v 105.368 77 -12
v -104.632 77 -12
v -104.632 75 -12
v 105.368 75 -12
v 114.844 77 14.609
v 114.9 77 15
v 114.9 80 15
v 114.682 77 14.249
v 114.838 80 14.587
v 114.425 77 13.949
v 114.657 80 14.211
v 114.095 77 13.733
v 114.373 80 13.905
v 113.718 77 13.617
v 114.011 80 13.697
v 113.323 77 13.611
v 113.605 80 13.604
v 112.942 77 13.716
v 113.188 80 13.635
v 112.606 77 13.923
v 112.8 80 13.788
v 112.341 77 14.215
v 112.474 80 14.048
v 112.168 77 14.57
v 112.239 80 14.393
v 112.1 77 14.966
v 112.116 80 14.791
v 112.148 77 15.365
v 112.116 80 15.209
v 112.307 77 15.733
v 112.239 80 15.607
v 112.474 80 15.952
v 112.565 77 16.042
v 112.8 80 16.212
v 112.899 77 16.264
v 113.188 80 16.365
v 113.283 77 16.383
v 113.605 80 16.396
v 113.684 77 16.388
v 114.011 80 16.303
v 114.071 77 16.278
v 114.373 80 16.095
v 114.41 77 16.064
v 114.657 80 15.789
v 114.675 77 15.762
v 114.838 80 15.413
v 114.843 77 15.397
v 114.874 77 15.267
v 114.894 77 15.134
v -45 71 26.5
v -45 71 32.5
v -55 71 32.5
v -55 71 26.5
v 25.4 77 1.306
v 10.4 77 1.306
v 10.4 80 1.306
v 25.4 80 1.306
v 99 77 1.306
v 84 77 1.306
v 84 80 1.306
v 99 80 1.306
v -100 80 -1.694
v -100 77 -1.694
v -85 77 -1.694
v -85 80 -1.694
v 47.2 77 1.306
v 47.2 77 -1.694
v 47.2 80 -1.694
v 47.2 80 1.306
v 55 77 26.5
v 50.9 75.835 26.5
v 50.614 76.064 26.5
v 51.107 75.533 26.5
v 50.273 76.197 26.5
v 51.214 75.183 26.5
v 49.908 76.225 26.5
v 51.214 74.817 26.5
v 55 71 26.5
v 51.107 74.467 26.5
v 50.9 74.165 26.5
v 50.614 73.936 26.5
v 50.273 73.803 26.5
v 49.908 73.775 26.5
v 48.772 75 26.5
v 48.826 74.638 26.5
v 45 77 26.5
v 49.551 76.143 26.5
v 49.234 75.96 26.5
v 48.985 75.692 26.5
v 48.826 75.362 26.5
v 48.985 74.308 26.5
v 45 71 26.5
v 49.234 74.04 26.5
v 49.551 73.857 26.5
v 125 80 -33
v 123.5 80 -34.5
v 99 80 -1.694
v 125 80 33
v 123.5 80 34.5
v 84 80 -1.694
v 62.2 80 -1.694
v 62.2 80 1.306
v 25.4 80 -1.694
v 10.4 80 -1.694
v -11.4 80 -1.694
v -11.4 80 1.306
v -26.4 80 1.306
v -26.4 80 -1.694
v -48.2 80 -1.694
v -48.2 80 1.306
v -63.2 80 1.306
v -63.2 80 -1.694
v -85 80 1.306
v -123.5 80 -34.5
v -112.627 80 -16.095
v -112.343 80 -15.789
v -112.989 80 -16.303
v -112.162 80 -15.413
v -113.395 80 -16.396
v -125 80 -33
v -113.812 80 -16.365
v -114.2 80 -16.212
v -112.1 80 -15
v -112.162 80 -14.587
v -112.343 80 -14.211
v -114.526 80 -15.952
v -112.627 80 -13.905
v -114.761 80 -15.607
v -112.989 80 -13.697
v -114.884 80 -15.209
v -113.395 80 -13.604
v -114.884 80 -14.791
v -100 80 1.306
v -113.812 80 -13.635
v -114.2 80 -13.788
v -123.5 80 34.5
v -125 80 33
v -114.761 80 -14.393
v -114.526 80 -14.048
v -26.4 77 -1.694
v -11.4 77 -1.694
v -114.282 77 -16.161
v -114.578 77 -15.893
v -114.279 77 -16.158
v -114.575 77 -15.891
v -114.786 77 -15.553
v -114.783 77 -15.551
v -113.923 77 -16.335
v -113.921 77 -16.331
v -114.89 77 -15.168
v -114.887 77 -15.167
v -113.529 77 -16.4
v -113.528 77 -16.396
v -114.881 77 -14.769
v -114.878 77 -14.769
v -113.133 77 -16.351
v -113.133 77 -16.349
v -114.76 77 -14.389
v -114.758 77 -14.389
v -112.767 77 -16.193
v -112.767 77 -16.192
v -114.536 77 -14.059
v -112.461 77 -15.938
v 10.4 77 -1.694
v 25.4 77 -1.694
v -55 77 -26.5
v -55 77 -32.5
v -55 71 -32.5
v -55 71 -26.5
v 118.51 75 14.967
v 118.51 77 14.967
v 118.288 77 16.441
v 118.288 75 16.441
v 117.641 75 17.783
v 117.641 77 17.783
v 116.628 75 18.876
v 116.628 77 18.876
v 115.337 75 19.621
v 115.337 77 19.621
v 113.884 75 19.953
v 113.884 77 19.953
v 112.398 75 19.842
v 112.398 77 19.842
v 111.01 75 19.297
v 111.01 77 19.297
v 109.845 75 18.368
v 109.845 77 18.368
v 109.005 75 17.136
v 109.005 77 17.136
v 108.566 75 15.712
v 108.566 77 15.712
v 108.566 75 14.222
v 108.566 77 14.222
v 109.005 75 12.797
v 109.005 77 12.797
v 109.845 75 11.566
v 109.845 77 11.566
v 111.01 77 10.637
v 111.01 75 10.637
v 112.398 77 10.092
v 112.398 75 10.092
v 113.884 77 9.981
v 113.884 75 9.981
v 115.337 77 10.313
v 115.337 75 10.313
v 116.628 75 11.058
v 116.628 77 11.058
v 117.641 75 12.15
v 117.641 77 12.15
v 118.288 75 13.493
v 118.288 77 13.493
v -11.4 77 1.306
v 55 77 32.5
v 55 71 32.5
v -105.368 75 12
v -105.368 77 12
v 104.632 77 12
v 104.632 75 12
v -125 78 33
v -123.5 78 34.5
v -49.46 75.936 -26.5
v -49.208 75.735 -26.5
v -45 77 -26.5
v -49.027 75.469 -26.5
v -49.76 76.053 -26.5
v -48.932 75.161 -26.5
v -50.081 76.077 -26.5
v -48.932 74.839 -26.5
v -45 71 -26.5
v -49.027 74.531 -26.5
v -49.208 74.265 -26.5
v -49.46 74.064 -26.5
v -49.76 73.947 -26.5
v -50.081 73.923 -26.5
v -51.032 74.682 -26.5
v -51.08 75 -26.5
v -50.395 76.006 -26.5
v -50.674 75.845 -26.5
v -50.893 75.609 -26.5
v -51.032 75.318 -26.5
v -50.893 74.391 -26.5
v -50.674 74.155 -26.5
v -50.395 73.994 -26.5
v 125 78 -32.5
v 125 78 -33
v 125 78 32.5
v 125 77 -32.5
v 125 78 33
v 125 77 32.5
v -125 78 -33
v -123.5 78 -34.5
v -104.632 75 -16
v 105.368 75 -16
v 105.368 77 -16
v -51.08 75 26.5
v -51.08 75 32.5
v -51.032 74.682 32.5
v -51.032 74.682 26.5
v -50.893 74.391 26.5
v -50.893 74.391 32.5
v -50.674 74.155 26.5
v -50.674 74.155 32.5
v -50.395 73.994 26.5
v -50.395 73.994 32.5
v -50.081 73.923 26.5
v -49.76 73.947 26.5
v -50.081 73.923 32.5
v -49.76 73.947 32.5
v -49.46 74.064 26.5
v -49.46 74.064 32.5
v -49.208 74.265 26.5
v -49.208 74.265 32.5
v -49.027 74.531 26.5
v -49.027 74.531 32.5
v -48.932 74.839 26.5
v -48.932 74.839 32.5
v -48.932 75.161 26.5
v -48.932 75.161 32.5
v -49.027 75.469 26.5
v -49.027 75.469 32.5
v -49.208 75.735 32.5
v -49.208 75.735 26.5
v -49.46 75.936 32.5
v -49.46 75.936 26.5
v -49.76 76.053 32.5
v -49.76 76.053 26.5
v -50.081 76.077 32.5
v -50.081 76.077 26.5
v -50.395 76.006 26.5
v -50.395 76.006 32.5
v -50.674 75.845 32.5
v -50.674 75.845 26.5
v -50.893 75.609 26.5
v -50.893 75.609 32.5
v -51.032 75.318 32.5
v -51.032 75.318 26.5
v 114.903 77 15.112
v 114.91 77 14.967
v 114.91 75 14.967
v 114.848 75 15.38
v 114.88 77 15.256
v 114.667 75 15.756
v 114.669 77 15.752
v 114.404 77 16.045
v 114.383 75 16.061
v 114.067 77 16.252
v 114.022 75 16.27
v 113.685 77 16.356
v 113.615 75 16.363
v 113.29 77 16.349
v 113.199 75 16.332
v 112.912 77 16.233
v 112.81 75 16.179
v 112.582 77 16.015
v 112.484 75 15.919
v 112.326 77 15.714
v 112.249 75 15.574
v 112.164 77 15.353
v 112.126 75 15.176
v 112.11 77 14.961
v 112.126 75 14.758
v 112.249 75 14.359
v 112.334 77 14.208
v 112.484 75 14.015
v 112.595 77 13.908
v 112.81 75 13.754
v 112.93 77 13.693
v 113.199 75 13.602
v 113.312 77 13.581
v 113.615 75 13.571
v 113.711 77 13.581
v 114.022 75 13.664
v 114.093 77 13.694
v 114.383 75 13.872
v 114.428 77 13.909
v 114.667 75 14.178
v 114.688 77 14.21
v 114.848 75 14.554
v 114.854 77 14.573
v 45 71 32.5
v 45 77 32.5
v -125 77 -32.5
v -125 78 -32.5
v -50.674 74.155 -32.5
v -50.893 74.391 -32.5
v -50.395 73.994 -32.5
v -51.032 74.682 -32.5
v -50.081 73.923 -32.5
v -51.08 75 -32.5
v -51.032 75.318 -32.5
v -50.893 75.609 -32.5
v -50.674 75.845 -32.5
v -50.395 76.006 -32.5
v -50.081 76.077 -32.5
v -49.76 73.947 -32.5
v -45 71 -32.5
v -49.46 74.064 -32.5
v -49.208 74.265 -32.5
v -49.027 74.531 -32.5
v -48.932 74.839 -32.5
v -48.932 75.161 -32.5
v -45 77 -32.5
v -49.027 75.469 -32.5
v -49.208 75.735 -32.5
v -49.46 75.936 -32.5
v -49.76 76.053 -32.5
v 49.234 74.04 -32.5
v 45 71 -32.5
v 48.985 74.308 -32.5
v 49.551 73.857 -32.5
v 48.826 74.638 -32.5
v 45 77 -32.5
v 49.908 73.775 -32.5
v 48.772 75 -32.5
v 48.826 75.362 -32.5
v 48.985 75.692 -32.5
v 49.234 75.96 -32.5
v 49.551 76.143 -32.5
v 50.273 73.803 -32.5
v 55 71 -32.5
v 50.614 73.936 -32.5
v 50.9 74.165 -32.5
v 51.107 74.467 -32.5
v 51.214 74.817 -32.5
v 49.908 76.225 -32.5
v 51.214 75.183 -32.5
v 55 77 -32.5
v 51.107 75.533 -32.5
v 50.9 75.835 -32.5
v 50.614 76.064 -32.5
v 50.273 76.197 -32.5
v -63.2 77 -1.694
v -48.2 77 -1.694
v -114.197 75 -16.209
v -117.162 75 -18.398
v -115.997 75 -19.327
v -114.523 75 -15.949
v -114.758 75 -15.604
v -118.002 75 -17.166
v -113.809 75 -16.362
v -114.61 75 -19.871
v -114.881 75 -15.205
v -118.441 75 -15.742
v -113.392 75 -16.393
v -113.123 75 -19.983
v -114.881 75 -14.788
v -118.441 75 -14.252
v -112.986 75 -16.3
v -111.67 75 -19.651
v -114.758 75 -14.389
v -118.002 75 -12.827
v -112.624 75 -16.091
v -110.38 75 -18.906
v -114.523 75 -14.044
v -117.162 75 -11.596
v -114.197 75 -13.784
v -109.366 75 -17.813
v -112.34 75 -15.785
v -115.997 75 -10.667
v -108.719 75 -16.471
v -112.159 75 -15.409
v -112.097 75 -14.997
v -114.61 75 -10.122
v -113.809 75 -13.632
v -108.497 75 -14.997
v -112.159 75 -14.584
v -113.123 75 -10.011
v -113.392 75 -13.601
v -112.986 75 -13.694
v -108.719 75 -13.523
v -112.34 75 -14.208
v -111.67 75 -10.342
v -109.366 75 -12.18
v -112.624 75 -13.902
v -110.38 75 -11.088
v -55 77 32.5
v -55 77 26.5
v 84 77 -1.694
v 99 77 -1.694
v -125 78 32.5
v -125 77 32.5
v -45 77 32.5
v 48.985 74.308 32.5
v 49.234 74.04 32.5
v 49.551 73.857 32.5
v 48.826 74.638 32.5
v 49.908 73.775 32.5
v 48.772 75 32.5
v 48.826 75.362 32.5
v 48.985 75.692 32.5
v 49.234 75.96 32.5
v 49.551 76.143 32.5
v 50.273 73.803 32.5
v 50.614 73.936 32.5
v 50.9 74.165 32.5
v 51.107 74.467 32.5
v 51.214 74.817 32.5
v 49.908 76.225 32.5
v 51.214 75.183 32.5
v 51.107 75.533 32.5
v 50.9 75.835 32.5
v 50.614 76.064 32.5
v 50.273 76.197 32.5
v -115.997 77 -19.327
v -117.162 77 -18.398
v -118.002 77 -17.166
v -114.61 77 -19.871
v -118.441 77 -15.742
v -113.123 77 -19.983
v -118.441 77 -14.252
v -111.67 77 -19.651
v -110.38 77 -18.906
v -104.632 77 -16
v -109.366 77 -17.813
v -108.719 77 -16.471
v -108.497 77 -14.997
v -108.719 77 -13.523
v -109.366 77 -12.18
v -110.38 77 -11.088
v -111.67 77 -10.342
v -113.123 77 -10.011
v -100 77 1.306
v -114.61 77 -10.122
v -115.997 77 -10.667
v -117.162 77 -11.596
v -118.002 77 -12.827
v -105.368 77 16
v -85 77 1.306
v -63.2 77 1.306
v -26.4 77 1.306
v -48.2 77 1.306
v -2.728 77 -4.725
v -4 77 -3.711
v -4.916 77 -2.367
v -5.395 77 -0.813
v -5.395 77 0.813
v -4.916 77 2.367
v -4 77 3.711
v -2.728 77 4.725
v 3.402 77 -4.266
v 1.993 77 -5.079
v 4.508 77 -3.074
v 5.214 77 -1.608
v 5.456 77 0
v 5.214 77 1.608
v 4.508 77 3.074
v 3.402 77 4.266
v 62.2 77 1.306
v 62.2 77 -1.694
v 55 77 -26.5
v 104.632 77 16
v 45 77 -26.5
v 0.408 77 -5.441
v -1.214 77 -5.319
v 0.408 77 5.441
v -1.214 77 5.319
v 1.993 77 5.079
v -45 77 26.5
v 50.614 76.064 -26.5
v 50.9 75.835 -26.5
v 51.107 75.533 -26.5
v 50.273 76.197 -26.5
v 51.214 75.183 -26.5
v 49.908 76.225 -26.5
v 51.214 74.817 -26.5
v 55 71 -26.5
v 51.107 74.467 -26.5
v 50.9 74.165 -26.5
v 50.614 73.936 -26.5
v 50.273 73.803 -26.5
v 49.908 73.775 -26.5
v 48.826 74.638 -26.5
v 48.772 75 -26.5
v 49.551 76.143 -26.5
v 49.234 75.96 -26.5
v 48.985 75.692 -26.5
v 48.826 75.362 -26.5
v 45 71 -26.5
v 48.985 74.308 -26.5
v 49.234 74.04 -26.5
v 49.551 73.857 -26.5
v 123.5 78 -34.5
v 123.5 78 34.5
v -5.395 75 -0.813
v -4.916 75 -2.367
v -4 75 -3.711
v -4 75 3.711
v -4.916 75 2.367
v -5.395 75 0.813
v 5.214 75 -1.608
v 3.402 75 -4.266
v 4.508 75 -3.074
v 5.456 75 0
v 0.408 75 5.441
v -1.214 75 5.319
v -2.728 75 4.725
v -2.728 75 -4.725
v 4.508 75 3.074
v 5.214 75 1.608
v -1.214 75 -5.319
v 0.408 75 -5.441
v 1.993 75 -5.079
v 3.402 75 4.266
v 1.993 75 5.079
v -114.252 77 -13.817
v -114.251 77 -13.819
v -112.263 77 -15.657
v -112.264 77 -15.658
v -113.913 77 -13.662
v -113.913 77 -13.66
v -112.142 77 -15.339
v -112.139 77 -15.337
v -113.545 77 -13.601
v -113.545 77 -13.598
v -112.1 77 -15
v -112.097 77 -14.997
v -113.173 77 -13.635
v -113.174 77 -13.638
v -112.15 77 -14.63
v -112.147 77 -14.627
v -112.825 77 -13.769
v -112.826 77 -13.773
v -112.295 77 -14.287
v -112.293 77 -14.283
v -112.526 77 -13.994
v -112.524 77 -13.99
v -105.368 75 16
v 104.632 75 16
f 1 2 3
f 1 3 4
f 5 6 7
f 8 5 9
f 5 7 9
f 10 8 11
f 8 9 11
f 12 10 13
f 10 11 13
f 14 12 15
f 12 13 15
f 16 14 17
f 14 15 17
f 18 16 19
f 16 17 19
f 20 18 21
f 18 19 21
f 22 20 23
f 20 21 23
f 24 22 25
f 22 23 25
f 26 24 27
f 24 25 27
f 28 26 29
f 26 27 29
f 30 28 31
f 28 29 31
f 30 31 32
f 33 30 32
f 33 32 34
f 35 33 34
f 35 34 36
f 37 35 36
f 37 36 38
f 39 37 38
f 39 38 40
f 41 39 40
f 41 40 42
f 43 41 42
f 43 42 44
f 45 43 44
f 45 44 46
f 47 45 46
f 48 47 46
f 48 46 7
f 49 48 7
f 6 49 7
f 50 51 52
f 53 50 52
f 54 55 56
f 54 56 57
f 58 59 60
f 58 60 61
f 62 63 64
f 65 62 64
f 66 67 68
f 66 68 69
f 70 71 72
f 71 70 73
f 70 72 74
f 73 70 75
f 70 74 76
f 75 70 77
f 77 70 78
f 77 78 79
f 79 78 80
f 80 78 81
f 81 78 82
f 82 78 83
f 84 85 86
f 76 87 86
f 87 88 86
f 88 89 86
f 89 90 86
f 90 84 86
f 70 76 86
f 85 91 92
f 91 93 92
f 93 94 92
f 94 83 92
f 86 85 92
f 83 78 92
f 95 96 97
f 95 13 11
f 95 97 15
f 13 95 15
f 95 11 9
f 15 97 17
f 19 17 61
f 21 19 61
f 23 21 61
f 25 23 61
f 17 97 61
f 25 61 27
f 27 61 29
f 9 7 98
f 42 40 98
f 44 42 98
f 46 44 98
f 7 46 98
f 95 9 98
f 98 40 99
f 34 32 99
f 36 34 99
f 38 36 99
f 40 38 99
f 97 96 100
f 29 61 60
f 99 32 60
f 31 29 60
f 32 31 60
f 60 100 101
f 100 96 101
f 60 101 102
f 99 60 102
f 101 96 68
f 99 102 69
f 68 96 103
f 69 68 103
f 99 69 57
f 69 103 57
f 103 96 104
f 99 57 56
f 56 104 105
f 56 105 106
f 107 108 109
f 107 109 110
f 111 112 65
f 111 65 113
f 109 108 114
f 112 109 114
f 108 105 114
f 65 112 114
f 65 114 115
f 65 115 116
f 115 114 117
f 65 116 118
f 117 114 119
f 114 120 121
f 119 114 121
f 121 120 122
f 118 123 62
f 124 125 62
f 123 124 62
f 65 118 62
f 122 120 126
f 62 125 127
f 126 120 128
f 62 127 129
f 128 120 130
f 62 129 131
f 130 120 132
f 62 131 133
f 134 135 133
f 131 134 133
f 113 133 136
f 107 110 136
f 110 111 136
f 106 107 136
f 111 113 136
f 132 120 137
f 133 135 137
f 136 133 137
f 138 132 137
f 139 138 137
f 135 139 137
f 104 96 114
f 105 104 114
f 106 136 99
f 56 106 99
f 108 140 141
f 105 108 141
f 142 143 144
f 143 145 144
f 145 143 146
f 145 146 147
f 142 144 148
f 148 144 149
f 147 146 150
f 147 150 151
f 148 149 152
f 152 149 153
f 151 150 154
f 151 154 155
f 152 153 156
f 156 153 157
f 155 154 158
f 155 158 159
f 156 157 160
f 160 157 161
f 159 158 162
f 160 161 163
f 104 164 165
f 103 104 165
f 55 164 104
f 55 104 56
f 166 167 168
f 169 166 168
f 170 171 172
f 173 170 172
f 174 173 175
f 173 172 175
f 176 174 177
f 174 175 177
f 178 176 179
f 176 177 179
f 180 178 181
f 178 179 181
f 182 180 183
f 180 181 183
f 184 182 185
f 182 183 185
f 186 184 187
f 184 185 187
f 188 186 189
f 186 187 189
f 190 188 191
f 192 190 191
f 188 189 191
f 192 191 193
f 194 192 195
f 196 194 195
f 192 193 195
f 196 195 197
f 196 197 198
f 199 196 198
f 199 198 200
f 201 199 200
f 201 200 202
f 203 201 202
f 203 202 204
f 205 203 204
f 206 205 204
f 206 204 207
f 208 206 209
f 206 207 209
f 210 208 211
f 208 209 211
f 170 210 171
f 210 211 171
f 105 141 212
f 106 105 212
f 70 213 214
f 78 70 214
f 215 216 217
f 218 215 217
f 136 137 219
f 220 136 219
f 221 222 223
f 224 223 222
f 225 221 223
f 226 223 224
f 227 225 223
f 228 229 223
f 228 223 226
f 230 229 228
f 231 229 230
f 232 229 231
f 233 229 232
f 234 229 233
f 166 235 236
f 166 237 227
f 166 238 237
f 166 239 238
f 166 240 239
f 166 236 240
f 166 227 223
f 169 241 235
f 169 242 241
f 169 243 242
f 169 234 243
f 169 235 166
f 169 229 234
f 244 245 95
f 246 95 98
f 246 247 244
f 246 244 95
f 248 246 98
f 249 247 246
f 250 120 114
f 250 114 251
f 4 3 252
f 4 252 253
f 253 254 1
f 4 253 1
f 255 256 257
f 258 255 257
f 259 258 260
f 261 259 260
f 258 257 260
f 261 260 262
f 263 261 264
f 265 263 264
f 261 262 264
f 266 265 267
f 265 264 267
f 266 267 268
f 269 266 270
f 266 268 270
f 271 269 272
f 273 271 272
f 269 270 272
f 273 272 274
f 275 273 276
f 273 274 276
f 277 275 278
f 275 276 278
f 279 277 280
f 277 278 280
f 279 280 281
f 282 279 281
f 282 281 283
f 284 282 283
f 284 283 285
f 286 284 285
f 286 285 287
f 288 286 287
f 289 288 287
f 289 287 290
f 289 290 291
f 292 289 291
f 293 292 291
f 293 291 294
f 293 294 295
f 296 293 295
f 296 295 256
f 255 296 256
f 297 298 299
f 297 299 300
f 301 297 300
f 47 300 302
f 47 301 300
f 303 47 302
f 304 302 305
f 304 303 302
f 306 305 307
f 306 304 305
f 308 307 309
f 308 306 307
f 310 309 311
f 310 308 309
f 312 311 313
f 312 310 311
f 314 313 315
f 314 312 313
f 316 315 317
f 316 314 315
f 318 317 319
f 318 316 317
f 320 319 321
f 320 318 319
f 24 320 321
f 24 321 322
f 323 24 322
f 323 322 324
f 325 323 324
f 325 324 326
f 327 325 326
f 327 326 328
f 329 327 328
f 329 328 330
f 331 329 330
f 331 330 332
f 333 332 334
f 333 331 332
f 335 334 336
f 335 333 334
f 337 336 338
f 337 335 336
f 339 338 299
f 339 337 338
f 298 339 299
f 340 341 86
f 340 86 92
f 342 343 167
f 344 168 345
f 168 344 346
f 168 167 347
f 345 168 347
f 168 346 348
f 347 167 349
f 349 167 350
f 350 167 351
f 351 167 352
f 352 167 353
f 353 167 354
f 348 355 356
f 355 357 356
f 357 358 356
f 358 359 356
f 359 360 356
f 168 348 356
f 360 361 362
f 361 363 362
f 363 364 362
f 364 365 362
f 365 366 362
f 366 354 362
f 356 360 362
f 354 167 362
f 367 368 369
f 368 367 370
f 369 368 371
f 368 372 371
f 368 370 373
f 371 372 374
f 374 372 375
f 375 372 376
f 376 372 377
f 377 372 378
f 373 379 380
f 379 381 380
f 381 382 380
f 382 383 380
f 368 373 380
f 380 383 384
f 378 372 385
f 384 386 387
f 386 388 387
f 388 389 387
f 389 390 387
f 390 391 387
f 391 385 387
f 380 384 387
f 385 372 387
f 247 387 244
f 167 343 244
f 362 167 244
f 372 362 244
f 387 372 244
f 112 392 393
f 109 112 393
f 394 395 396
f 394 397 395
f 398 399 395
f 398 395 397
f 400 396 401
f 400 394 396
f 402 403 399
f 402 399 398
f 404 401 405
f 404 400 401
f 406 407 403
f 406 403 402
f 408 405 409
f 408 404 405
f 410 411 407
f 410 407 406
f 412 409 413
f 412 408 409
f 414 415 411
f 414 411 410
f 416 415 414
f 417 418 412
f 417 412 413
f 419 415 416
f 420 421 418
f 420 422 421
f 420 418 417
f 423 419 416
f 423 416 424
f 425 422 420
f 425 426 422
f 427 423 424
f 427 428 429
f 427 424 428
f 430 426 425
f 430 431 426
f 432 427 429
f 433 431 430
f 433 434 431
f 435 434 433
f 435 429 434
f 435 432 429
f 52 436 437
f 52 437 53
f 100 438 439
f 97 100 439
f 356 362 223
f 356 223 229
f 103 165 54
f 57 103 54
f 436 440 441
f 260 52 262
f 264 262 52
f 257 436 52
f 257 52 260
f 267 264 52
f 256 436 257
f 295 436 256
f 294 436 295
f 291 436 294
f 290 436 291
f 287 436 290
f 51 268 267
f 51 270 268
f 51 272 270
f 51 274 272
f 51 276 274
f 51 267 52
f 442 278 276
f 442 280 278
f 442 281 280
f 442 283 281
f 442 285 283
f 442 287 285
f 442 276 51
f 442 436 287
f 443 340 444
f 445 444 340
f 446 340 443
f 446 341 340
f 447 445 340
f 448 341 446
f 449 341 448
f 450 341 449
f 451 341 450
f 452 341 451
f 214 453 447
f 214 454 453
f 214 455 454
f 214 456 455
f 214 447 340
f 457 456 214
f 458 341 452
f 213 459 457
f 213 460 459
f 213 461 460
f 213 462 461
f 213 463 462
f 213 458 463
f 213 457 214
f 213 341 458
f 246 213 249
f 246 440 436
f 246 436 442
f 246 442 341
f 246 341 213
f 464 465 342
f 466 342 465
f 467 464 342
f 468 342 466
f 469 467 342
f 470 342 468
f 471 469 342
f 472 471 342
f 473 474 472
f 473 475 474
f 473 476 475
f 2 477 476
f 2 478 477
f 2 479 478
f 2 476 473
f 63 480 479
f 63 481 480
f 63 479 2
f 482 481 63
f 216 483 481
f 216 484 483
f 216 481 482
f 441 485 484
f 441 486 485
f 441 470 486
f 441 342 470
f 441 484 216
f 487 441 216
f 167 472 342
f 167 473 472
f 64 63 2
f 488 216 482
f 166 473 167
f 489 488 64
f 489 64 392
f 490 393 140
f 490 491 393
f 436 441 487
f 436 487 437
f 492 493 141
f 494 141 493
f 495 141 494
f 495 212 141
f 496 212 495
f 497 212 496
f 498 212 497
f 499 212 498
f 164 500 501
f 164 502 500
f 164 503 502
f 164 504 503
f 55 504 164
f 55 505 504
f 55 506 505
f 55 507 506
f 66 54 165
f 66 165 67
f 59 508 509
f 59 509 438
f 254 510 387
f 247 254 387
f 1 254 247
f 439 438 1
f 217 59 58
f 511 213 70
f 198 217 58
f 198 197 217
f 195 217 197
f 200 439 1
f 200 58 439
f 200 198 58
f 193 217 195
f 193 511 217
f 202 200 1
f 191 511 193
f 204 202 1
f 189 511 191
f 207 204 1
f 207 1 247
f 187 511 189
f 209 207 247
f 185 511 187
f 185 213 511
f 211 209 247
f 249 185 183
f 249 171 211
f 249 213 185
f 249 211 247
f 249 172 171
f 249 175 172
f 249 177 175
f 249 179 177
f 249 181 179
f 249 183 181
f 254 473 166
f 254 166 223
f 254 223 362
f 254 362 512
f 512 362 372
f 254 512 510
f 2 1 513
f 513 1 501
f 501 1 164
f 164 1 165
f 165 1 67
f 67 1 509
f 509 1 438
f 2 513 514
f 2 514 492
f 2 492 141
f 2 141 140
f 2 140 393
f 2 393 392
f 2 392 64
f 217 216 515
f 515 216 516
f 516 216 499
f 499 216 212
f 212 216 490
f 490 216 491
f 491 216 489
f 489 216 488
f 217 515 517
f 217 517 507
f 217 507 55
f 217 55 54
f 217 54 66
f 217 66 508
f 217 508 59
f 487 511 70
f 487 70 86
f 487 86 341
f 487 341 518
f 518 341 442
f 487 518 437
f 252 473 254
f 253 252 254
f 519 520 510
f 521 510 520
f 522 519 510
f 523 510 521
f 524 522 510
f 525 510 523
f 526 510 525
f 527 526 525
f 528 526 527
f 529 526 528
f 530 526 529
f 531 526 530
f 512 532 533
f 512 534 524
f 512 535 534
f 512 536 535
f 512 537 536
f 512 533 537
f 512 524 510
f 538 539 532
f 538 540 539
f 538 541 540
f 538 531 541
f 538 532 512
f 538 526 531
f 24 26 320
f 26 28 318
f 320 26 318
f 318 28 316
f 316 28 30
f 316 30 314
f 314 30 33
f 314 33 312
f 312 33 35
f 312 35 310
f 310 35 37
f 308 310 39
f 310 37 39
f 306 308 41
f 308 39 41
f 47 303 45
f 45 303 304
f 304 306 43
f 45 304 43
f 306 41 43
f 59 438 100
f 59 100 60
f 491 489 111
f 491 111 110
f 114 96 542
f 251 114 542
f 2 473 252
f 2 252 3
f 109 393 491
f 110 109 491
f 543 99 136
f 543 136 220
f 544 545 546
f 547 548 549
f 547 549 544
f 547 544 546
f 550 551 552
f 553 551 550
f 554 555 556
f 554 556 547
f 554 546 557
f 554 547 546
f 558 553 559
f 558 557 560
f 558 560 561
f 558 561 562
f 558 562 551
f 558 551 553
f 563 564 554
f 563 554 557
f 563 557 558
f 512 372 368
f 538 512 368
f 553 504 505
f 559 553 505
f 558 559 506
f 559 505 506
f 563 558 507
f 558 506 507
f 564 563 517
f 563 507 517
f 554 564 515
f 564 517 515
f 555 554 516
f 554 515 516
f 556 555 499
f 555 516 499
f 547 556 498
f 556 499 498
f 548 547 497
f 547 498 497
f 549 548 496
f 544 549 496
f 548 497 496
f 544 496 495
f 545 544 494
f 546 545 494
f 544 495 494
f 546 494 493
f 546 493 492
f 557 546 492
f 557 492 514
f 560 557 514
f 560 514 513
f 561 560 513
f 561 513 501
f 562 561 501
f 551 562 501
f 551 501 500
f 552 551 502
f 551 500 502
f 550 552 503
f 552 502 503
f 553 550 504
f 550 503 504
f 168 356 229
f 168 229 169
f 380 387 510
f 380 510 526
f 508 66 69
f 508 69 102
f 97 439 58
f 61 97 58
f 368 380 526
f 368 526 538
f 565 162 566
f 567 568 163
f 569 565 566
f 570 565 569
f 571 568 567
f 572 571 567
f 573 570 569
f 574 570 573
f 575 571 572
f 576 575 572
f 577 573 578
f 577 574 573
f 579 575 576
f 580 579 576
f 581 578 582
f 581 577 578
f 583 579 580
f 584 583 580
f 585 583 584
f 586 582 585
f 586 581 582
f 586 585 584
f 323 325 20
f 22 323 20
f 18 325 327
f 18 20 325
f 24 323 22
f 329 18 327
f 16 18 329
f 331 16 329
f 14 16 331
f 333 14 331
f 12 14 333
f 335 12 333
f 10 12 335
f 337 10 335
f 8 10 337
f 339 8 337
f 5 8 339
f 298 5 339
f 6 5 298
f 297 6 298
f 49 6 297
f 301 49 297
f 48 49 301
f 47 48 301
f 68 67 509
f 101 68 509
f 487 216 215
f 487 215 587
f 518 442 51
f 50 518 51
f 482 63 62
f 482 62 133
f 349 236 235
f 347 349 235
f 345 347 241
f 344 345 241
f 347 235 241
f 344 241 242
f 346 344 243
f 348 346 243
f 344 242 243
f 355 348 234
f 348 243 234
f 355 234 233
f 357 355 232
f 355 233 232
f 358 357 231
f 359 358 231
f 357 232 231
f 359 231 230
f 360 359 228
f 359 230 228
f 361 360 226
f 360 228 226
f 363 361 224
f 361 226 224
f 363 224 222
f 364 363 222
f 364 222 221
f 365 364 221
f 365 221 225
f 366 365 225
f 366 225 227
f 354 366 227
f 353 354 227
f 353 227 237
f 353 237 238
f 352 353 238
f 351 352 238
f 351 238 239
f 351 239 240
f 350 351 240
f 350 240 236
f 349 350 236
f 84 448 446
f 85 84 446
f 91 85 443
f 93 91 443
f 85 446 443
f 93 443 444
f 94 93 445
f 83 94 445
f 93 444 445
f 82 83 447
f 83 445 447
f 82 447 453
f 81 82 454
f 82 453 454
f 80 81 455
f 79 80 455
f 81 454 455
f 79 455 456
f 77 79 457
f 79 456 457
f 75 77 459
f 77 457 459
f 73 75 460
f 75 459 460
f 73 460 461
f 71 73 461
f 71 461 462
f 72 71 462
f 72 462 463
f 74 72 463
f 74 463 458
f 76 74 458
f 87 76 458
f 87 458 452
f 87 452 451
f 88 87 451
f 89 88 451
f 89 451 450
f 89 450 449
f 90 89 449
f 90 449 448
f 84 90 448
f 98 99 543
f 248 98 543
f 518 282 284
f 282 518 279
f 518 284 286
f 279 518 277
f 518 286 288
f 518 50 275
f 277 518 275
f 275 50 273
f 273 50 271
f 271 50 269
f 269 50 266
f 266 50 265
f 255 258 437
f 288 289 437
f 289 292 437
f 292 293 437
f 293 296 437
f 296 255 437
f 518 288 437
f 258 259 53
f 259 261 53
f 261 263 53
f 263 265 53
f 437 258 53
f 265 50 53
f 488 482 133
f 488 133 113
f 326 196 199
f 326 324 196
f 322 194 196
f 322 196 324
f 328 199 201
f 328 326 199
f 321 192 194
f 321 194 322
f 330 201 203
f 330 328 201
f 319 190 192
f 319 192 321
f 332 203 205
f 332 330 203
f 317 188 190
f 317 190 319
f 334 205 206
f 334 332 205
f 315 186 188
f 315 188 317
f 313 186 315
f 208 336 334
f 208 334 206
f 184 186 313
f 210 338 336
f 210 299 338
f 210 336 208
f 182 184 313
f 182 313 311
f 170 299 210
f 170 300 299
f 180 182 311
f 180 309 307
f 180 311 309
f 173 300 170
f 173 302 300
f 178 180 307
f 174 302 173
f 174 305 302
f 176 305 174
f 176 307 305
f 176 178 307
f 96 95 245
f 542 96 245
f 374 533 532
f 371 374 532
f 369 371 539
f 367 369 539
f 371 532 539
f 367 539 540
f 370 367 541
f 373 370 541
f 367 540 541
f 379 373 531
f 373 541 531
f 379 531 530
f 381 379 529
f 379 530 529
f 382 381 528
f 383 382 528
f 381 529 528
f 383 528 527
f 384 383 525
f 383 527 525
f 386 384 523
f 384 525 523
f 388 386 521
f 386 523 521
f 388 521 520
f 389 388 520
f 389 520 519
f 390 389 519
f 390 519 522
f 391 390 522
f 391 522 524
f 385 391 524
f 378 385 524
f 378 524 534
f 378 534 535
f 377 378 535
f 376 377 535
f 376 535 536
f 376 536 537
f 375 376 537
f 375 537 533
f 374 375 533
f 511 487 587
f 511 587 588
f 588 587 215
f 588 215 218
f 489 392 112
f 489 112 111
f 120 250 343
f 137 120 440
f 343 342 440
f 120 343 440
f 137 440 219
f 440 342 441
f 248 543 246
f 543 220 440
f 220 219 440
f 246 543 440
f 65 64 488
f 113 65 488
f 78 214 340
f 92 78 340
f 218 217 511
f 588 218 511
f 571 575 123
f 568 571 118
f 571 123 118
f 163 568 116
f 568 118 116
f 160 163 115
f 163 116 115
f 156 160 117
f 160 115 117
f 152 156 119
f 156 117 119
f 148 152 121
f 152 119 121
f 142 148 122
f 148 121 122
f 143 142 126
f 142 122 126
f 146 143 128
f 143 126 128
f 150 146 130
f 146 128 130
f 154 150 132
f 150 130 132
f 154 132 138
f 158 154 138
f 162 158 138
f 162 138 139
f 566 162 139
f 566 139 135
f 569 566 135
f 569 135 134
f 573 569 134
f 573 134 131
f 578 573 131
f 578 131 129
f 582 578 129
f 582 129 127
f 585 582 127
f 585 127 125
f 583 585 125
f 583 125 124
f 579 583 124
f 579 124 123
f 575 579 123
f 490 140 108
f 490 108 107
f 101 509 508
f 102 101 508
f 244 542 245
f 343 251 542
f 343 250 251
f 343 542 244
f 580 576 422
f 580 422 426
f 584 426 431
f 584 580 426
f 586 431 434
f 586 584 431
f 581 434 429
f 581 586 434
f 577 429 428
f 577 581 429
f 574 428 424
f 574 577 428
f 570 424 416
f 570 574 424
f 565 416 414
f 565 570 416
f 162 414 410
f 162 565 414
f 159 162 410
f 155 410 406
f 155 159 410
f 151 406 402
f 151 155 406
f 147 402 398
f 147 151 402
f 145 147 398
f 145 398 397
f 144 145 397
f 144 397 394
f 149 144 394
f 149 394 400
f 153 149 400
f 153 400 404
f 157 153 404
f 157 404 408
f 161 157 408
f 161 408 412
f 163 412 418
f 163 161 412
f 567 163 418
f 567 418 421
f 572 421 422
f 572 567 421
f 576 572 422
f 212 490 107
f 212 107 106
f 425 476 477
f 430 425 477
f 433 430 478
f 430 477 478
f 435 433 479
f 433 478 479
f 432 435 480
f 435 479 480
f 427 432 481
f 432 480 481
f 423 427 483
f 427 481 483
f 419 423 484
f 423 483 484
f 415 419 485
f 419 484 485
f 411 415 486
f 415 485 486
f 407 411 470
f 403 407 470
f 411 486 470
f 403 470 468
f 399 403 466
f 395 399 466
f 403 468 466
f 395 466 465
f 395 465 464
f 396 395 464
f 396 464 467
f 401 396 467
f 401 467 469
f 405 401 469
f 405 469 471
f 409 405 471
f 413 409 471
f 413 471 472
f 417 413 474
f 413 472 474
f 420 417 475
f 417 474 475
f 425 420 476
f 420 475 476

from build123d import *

# Parameters (mm, degrees)
SKETCH007_W            = 250
SKETCH007_H            = 65
PAD004_DEPTH           = 3
SKETCH015_R            = 1.4
POCKET007_DEPTH        = 5
SKETCH032_W            = 10
SKETCH032_H            = 8
PAD011_DEPTH           = 6
SKETCH033_R            = 1.228205
SKETCH033_R_2          = 1.080341
POCKET017_DEPTH        = 65.001
SKETCH036_R            = 5
SKETCH036_R_2          = 1.4
SKETCH036_R_3          = 5.456257
SKETCH036_W            = 210
SKETCH036_H            = 4
PAD013_DEPTH           = 2
SKETCH037_W            = 15
SKETCH037_H            = 3
POCKET019_DEPTH        = 5
LINEARPATTERN002_COUNT = 6
LINEARPATTERN002_PITCH = 36.8
SKETCH044_W            = 2
SKETCH044_H            = 2
PAD017_DEPTH           = 250
CHAMFER025_SIZE        = 1.5


with BuildPart() as part:
    # Sketch007 → Pad004 (new body)
    with BuildSketch(Plane.XZ):
        Rectangle(SKETCH007_W, SKETCH007_H)
    extrude(amount=PAD004_DEPTH)

    # Sketch015 (on Face5 of Pad004) → Pocket007 (cut)
    with BuildSketch(Plane(origin=(0, 0, 0), x_dir=(1, 0, 0), z_dir=(0, 1, 0))):
        with Locations((-113.5, 15)):
            Circle(SKETCH015_R)
        with Locations((113.5, -15)):
            Circle(SKETCH015_R)
    extrude(amount=-POCKET007_DEPTH, mode=Mode.SUBTRACT)

    # Sketch032 (on Face1 of Pocket007) → Pad011 (join)
    with BuildSketch(Plane(origin=(0, 0, 32.5), x_dir=(-1, 0, 0), z_dir=(0, 0, 1))):
        with Locations((-50, 5)):
            Rectangle(SKETCH032_W, SKETCH032_H)
        with Locations((50, 5)):
            Rectangle(SKETCH032_W, SKETCH032_H)
    pad011 = extrude(amount=-PAD011_DEPTH)

    # Mirrored: Pad011 across XY
    add(pad011.mirror(Plane.XY))

    # Sketch033 (on Face23 of Mirrored) → Pocket017 (cut, through all)
    with BuildSketch(Plane(origin=(0, 0, 32.5), x_dir=(-1, 0, 0), z_dir=(0, 0, 1))):
        with Locations((-50, 5)):
            Circle(SKETCH033_R)
        with Locations((50, 5)):
            Circle(SKETCH033_R_2)
    extrude(amount=-POCKET017_DEPTH, mode=Mode.SUBTRACT)

    # Sketch036 (on Face4 of Pocket017) → Pad013 (join)
    with BuildSketch(Plane.XZ.offset(3)):
        with Locations((-113.49704, -14.99673)):
            Circle(SKETCH036_R)
        with Locations((-113.49704, -14.99673)):
            Circle(SKETCH036_R_2, mode=Mode.SUBTRACT)
        with Locations((113.510239, 14.966872)):
            Circle(SKETCH036_R)
        with Locations((113.510239, 14.966872)):
            Circle(SKETCH036_R_2, mode=Mode.SUBTRACT)
        Circle(SKETCH036_R_3)
        with Locations((-0.3682397708, 14)):
            Rectangle(SKETCH036_W, SKETCH036_H)
        with Locations((0.3682397708, -14)):
            Rectangle(SKETCH036_W, SKETCH036_H)
    extrude(amount=PAD013_DEPTH)

    # Sketch037 (on Face4 of Pad013) → Pocket019 (cut)
    with BuildSketch(Plane.XZ.offset(3)):
        with Locations((-92.5, -0.19377)):
            Rectangle(SKETCH037_W, SKETCH037_H)
    pocket019 = extrude(amount=-POCKET019_DEPTH, mode=Mode.SUBTRACT)

    # LinearPattern002: Pocket019 ×6
    with Locations(*[(i * LINEARPATTERN002_PITCH, 0, 0) for i in range(1, LINEARPATTERN002_COUNT)]):
        add(pocket019, mode=Mode.SUBTRACT)

    # Sketch044 (on Face7 of MultiTransform001) → Pad017 (join)
    with BuildSketch(Plane(origin=(-125, 0, 0), x_dir=(0, 0, -1), z_dir=(-1, 0, 0))):
        with Locations((-33.5, 1)):
            Rectangle(SKETCH044_W, SKETCH044_H)
    pad017 = extrude(amount=-PAD017_DEPTH)

    # Mirrored003: Pad017 across Sketch044 V_Axis
    add(pad017.mirror(Plane(origin=(-125, 0, 0), x_dir=(-1, 0, 0), z_dir=(0, 0, -1))))

    # Chamfer025
    chamfer025_edges = [part.edges().sort_by_distance(p)[0] for p in [
        (125, -1, -34.5),
        (125, -1, 34.5),
        (-125, -1, 34.5),
        (-125, -1, -34.5),
    ]]
    chamfer(chamfer025_edges, length=CHAMFER025_SIZE)


with BuildPart() as part_1:
    # Body003 placement: moved
    add(part.part.moved(Location((0, 80, 0))))


solid = part_1.part
